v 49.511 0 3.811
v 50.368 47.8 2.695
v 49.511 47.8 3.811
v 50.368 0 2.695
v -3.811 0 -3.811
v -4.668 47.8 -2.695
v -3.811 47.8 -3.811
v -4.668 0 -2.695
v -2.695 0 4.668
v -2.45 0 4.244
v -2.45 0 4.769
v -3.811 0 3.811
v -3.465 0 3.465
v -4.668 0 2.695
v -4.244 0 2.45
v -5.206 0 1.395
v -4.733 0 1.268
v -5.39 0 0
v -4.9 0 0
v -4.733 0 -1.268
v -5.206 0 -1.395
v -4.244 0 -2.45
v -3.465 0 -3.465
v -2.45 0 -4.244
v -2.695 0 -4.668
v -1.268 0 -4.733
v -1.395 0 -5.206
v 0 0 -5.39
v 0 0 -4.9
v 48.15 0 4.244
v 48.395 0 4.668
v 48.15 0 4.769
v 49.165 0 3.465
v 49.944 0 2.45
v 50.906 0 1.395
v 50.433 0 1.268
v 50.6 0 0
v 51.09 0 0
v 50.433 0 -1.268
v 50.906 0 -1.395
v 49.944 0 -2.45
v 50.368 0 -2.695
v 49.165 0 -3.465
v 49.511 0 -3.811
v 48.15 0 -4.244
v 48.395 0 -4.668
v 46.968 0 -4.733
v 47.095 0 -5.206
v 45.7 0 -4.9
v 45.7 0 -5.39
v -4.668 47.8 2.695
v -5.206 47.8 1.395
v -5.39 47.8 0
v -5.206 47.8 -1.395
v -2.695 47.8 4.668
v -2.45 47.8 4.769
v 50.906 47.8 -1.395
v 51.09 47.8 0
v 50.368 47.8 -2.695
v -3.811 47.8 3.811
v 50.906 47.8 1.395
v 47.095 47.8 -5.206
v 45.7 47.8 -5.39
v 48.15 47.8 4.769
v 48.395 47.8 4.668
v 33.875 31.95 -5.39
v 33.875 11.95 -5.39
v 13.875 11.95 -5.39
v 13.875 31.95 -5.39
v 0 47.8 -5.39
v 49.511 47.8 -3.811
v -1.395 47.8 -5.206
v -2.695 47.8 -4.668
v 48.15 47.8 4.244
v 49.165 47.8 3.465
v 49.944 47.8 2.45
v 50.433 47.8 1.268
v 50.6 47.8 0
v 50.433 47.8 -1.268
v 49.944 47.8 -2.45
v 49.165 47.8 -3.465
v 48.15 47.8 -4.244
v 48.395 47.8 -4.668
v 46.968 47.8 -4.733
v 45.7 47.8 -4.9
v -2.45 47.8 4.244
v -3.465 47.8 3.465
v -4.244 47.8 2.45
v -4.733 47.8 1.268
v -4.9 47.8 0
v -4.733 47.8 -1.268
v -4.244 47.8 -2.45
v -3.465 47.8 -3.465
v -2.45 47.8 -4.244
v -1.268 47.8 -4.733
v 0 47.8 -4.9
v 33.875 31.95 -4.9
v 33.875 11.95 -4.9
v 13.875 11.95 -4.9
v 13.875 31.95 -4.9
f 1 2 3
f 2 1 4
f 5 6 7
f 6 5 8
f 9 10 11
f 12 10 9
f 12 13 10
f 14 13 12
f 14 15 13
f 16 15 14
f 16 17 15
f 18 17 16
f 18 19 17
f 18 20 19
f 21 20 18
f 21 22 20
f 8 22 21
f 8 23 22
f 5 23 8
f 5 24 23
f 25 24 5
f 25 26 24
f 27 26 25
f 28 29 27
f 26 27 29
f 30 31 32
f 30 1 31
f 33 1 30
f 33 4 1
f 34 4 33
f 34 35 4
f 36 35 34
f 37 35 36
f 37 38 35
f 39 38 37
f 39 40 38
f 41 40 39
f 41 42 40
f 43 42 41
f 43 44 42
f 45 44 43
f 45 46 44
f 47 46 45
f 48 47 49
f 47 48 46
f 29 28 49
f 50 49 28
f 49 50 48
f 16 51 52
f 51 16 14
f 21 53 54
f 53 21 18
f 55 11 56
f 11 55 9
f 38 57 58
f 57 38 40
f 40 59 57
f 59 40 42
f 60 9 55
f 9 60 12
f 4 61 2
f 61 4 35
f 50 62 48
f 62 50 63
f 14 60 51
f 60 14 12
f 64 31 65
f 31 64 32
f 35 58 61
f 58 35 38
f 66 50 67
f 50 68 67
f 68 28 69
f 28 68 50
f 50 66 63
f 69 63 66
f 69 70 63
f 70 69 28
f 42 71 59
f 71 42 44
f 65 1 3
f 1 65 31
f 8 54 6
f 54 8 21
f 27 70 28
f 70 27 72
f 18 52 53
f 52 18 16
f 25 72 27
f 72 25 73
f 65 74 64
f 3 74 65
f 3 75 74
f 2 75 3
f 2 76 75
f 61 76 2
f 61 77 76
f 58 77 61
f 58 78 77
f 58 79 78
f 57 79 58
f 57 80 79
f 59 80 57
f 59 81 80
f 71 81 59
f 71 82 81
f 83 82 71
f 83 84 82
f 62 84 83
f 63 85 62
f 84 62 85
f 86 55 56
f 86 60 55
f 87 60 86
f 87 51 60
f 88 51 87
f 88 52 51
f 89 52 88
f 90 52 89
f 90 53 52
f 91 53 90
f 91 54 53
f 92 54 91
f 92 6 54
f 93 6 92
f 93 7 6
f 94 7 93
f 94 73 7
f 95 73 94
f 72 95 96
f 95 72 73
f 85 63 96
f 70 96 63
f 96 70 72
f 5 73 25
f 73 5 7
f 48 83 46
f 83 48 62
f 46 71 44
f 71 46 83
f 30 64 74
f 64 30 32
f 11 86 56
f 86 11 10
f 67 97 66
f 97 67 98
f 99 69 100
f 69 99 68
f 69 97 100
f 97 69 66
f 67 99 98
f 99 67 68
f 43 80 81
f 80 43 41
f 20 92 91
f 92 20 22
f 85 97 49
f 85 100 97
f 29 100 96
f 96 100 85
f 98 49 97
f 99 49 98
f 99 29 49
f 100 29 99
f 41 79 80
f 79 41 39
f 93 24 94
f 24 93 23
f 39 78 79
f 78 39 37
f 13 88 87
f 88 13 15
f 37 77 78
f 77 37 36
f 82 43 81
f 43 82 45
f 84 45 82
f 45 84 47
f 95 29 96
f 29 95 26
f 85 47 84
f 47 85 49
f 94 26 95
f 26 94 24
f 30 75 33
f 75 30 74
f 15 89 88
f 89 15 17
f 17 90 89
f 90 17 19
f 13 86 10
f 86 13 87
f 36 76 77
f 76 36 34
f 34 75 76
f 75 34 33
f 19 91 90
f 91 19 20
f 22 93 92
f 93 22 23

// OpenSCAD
$fn=24;
rad=9.8/2;
height=47.8;
width=55.5;

module full_case(x){
	rotate([-90,0,0])
	hull(){
		cylinder(h=height,r=rad*x);
		translate([width-rad*2,0,0])
		cylinder(h=height,r=rad*x);
	}
}

difference(){
	full_case(1.1);
	translate([-rad/2,0,rad/4])
	cube([width-rad,height,rad]);
	translate([width/4,height/4,-rad*2])
	cube(20);
	full_case(1);
}
